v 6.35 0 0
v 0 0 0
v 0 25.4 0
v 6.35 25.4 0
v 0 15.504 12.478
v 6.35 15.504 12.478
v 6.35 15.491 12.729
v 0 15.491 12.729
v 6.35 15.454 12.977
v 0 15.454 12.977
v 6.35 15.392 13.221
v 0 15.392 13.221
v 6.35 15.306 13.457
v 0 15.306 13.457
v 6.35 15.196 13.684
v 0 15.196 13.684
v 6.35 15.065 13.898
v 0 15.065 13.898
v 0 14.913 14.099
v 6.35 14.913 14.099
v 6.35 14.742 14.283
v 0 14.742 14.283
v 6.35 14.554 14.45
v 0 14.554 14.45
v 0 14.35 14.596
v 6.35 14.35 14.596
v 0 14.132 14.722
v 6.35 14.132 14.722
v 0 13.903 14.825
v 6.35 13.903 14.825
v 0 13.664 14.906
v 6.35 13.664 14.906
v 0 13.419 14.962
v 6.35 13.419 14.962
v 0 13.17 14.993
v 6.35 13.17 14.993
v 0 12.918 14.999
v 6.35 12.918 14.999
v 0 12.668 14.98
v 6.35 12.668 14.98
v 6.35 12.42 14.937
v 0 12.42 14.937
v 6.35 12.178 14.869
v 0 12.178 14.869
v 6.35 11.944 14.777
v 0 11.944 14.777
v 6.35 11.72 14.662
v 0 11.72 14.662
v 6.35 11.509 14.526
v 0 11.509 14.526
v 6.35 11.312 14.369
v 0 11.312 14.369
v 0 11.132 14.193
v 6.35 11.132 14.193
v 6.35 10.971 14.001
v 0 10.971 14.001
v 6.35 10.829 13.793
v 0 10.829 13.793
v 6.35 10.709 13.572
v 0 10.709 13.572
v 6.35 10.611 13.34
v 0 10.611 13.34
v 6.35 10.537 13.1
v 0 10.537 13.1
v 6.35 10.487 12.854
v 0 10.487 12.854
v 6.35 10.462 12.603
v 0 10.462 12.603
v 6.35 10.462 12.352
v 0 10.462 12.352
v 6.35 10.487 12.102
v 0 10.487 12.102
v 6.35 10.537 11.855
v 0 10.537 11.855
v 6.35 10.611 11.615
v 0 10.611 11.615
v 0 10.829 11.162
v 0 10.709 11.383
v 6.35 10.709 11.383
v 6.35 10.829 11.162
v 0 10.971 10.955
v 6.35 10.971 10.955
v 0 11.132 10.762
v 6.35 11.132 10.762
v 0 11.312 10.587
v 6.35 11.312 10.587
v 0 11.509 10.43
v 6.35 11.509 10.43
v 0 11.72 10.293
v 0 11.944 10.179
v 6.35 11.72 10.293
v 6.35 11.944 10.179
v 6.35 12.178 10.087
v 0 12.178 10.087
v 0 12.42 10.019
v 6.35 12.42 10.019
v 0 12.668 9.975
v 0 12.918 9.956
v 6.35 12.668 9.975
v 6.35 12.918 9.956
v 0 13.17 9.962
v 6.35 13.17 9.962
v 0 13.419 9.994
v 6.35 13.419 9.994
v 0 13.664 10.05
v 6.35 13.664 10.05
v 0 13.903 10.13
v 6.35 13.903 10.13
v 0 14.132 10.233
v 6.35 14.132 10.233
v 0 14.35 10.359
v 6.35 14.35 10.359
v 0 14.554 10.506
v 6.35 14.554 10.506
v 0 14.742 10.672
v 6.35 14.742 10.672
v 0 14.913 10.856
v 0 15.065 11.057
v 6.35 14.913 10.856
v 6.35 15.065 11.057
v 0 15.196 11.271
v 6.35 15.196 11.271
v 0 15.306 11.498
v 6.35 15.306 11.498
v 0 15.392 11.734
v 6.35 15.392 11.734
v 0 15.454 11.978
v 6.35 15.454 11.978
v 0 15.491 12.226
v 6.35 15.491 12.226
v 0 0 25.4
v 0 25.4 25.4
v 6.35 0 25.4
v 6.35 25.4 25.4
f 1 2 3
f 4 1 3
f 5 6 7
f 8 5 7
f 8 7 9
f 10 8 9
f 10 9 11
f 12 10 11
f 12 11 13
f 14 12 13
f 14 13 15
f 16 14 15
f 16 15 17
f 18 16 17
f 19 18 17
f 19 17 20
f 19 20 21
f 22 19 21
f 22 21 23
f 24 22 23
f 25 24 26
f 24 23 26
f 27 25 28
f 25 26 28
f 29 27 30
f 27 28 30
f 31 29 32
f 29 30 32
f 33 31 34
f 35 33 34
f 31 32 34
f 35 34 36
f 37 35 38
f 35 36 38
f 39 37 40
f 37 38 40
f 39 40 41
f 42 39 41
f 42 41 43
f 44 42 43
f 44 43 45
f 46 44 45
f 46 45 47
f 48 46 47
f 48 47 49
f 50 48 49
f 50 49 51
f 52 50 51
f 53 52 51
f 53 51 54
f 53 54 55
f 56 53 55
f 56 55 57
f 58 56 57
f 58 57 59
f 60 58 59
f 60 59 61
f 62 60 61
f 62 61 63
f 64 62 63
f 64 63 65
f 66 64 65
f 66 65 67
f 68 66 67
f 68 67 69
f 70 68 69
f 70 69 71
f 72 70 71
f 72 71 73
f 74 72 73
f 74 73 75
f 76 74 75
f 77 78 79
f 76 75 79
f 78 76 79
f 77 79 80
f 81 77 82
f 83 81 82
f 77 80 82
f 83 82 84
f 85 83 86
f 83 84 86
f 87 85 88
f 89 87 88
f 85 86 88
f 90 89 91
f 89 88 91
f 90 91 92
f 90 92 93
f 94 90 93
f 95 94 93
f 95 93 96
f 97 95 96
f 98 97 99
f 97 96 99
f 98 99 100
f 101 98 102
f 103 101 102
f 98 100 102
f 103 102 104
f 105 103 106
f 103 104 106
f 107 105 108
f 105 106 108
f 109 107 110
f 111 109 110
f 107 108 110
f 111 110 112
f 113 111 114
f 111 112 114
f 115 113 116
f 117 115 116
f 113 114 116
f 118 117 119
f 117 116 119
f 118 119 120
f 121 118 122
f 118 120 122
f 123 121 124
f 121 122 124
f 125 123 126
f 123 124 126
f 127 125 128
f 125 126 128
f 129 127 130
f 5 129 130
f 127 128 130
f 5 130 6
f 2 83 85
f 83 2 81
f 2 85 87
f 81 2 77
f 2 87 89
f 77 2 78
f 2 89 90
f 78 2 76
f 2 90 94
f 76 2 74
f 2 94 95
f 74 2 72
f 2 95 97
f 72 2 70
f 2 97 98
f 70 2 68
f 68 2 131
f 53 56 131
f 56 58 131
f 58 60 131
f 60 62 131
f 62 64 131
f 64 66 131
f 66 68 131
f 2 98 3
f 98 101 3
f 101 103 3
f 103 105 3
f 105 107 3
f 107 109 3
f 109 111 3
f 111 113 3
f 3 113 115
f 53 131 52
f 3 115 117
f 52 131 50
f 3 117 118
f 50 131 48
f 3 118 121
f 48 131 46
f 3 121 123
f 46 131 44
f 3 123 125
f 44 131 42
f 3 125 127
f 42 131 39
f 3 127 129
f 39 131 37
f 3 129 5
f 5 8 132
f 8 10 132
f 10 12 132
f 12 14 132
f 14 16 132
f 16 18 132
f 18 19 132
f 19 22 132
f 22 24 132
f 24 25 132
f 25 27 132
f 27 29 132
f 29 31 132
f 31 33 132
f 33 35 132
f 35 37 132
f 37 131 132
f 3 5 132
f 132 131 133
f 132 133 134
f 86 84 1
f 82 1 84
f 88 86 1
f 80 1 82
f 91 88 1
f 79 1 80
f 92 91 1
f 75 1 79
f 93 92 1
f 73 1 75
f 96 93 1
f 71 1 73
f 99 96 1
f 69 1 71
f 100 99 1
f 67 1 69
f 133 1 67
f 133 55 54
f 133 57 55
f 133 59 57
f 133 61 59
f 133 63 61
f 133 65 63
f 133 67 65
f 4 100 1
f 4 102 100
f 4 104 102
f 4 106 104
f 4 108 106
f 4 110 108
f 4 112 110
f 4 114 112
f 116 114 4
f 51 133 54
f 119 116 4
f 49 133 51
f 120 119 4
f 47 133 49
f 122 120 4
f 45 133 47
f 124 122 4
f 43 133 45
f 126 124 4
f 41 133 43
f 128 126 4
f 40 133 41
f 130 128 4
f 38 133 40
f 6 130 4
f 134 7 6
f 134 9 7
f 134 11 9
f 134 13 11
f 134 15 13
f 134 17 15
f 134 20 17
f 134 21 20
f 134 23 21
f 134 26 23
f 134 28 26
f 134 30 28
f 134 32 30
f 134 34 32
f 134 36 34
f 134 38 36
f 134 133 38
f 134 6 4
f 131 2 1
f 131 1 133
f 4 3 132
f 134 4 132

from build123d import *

# Parameters (mm, degrees)
F0_W     = 25.4
F0_H     = 25.4
F1_DEPTH = 6.35
F2_R     = 2.52222
F3_DEPTH = 25.4


with BuildPart() as f1:
    # F0 (on Right) → F1 (new body)
    with BuildSketch(Plane.YZ):
        with Locations((12.7, 12.7)):
            Rectangle(F0_W, F0_H)
    extrude(amount=F1_DEPTH)

    # F2 (on face) → F3 (cut)
    with BuildSketch(Plane.YZ.offset(6.35)):
        with Locations((12.981366, 12.477624)):
            Circle(F2_R)
    extrude(amount=-F3_DEPTH, mode=Mode.SUBTRACT)


solid = f1.part
